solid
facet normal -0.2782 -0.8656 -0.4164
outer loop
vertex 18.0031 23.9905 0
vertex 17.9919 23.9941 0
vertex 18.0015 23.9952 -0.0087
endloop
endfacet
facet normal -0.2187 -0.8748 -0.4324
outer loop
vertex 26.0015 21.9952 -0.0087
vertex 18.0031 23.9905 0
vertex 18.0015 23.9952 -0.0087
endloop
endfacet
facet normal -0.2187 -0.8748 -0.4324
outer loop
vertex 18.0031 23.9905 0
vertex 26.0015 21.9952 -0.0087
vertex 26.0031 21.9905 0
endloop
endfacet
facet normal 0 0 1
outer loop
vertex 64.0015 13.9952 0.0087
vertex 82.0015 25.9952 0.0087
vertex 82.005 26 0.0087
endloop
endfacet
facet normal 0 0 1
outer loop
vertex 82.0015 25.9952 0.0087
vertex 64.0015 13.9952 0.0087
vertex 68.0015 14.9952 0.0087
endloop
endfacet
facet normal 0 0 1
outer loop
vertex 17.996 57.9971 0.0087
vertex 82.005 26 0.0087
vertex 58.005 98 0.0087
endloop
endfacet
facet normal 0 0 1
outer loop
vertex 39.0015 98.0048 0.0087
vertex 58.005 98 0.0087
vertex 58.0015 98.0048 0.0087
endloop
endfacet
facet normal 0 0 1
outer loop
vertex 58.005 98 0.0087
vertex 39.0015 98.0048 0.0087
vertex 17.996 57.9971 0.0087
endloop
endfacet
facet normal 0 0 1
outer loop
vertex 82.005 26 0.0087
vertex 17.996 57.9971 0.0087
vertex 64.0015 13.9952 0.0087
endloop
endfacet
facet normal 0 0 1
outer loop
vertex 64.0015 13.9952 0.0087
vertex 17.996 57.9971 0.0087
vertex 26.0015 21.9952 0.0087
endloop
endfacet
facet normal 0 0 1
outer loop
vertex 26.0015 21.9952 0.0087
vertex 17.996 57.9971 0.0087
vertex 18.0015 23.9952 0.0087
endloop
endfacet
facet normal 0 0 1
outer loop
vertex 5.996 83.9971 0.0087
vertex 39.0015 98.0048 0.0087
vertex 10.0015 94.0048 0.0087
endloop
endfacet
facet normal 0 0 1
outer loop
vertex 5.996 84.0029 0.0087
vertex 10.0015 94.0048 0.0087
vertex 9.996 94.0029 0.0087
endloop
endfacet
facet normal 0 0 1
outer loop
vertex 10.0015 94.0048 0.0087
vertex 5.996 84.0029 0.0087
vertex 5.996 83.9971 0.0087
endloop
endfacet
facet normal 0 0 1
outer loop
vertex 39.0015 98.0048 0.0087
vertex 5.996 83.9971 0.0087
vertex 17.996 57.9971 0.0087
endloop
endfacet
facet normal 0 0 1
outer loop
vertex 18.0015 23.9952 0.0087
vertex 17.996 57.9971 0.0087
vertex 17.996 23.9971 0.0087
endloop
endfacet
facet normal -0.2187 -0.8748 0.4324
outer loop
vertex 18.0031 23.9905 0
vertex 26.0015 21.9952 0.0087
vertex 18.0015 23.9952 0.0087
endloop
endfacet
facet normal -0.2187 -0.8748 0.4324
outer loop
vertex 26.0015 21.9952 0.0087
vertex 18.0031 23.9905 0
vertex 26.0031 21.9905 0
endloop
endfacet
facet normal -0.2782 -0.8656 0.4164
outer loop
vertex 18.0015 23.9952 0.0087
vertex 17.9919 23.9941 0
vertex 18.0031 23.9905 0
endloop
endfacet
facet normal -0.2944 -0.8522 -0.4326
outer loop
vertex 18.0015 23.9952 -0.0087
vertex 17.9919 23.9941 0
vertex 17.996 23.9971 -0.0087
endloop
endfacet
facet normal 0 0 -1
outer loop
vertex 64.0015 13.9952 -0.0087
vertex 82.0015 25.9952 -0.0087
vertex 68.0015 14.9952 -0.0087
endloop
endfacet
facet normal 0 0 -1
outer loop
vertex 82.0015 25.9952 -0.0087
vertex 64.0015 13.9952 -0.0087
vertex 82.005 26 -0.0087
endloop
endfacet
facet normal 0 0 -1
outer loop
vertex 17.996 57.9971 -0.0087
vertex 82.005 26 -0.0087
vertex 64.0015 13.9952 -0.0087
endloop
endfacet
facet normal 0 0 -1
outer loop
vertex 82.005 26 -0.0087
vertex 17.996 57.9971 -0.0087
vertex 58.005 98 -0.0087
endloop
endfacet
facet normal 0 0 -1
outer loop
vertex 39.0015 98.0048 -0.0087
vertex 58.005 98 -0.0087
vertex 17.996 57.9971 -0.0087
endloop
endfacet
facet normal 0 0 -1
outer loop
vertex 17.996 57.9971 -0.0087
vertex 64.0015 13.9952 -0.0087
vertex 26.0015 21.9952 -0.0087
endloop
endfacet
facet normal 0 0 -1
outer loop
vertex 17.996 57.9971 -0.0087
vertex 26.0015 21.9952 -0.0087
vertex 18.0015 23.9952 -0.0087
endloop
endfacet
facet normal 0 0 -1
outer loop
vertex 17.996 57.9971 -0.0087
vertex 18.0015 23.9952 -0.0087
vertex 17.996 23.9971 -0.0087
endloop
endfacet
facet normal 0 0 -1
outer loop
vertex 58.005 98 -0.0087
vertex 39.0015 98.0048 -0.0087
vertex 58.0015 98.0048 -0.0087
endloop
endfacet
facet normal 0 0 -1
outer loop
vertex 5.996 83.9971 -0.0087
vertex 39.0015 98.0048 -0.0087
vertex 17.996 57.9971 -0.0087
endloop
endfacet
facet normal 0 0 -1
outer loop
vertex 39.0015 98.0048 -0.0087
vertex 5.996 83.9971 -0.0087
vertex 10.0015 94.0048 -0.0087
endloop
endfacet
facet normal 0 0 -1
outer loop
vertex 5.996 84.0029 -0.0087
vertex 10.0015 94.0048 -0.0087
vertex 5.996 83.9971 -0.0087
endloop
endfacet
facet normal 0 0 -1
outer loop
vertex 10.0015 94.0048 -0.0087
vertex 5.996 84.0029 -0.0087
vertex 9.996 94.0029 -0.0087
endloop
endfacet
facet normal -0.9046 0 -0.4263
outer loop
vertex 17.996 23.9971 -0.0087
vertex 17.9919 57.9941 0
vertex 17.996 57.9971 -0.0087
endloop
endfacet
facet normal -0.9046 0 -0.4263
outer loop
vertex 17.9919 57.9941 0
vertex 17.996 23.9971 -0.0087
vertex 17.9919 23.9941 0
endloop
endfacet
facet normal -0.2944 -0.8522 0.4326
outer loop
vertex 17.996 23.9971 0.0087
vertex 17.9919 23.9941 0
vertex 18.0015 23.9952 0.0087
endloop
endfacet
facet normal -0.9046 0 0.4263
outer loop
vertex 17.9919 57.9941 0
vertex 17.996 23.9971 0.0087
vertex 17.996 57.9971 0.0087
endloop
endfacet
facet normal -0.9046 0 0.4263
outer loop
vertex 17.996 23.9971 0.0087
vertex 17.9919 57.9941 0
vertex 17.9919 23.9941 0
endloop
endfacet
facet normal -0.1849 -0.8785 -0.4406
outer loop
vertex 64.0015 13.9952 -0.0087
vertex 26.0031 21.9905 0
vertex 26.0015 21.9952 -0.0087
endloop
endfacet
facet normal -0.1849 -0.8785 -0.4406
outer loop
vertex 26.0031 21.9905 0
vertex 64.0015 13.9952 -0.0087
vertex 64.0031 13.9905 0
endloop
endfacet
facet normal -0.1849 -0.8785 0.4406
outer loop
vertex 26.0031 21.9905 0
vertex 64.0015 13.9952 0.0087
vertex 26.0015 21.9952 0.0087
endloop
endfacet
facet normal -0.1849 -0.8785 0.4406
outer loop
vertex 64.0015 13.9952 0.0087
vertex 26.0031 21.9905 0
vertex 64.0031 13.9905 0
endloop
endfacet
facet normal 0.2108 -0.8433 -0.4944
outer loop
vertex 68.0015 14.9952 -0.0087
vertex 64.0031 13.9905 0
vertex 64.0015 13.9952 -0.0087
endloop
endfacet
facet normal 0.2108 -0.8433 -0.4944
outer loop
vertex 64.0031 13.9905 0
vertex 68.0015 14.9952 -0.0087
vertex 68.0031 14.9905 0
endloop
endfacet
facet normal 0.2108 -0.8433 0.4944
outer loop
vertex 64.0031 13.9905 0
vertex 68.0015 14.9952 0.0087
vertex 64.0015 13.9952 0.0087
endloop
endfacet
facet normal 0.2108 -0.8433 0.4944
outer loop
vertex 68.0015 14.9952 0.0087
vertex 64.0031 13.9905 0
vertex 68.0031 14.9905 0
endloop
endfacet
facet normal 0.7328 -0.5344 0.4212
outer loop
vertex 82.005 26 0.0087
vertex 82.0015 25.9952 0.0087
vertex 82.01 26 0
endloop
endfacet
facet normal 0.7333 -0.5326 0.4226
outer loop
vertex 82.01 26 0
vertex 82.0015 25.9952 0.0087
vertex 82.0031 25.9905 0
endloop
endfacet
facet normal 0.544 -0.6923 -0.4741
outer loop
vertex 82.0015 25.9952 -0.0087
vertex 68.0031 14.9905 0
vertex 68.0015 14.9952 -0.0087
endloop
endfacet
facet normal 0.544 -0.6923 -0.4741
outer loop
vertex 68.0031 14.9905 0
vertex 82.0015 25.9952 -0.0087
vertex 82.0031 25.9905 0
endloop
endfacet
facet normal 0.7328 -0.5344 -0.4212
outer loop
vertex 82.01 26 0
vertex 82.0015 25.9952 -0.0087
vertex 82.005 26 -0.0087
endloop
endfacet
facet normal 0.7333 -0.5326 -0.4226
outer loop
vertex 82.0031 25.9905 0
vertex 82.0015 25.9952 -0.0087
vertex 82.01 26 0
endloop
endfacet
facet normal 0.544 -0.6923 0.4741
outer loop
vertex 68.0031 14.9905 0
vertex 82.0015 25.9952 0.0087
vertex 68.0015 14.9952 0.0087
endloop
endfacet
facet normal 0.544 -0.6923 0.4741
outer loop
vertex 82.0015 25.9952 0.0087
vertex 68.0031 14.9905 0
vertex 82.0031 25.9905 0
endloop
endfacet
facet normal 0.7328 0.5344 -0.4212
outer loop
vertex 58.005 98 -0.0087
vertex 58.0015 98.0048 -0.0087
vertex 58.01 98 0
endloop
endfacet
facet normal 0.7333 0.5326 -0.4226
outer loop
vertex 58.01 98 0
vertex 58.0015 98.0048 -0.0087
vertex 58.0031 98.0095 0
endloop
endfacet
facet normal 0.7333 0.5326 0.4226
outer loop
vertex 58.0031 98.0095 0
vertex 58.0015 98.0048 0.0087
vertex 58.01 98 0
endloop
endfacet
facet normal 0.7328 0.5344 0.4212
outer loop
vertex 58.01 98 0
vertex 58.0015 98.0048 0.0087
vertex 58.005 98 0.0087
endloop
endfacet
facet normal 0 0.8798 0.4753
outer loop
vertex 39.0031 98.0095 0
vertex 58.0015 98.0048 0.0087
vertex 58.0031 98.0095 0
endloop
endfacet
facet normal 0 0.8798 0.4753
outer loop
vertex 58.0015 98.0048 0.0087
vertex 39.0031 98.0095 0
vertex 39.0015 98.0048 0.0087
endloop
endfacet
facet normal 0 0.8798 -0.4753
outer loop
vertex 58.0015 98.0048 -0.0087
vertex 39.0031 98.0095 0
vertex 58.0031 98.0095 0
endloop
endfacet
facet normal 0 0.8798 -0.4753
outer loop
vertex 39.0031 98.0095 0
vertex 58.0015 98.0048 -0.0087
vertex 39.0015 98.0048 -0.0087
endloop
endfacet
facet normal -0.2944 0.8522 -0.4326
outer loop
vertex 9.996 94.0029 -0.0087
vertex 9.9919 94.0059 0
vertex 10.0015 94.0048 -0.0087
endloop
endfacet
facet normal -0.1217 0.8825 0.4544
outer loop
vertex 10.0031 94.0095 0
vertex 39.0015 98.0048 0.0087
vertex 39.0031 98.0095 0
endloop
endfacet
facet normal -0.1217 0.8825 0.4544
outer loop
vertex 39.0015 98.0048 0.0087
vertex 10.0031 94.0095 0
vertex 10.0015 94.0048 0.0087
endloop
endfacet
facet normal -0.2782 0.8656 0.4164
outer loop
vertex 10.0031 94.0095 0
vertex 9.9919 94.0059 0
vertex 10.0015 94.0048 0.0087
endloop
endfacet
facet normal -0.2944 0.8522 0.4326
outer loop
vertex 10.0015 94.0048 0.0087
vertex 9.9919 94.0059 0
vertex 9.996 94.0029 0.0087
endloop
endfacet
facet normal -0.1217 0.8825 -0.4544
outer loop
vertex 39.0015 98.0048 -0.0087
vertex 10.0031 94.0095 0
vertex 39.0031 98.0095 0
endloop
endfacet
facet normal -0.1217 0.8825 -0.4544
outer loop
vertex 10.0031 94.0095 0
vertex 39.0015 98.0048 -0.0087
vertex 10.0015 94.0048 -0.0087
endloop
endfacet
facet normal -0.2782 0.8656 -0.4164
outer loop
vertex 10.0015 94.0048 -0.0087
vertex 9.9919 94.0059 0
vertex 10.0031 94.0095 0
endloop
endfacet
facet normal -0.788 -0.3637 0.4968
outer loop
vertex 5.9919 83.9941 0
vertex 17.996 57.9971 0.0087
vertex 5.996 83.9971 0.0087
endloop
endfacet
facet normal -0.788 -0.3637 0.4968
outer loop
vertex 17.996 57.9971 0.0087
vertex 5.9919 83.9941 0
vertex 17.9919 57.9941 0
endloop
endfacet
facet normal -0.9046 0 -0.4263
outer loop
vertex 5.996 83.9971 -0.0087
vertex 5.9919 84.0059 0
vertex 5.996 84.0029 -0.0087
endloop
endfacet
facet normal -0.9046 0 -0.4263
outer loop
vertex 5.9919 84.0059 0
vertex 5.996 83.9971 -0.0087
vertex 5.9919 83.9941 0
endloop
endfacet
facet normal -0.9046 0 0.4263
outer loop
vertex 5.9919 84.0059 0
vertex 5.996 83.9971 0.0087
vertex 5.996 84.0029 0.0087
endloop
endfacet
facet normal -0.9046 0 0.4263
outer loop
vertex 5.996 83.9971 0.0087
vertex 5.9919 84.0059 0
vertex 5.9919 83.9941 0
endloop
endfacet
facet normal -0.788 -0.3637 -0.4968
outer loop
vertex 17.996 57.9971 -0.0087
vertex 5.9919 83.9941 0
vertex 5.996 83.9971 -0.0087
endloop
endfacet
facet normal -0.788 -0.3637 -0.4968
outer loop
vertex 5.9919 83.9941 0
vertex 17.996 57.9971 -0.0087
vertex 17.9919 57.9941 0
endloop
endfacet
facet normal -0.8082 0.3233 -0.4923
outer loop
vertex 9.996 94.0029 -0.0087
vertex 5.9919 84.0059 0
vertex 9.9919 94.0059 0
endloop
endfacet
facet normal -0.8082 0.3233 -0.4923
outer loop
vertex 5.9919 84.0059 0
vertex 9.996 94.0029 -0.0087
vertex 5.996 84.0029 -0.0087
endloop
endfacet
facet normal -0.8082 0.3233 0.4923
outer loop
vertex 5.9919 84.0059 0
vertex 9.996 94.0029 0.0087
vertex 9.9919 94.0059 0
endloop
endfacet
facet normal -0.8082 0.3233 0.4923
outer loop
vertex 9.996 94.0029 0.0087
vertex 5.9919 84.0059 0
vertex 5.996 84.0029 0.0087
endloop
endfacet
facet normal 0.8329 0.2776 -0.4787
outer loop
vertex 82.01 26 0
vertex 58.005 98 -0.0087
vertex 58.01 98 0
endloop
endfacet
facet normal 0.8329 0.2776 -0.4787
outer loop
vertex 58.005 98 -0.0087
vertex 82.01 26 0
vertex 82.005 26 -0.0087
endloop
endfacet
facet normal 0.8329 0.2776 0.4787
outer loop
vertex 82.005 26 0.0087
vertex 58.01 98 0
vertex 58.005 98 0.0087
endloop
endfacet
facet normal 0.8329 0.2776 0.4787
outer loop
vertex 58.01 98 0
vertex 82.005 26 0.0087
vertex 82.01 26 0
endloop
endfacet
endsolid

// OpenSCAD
color([0.3519350680925015,0.6477014615427978,0.14125726454845833]) hull(){
    translate([18,24]) sphere(0.01);
    translate([26,22]) sphere(0.01);
    translate([42,29]) sphere(0.01);
}
color([0.23013900541024712,0.8285218163248013,0.9603761550286747]) hull(){
    translate([26,22]) sphere(0.01);
    translate([64,14]) sphere(0.01);
    translate([42,29]) sphere(0.01);
}
color([0.6050710034948523,0.017553655236826726,0.43262871278032167]) hull(){
    translate([42,29]) sphere(0.01);
    translate([64,14]) sphere(0.01);
    translate([58,33]) sphere(0.01);
}
color([0.2571490251669072,0.4480229944680496,0.14517873337393172]) hull(){
    translate([64,14]) sphere(0.01);
    translate([68,15]) sphere(0.01);
    translate([58,33]) sphere(0.01);
}
color([0.8405131005933094,0.9776834869331054,0.10300019528175153]) hull(){
    translate([58,33]) sphere(0.01);
    translate([68,15]) sphere(0.01);
    translate([82,26]) sphere(0.01);
}
color([0.998153073210626,0.8535026464000083,0.6855970549077809]) hull(){
    translate([42,29]) sphere(0.01);
    translate([44,55]) sphere(0.01);
    translate([58,33]) sphere(0.01);
}
color([0.7995005100691247,0.34047238184459006,0.1286635278612125]) hull(){
    translate([42,29]) sphere(0.01);
    translate([44,55]) sphere(0.01);
    translate([44,47]) sphere(0.01);
}
color([0.6020598448119898,0.9167847797194366,0.02081986636819022]) hull(){
    translate([44,47]) sphere(0.01);
    translate([18,58]) sphere(0.01);
    translate([42,29]) sphere(0.01);
}
color([0.9135118305629362,0.3823609034395232,0.42581309278619206]) hull(){
    translate([18,58]) sphere(0.01);
    translate([18,24]) sphere(0.01);
    translate([42,29]) sphere(0.01);
}
color([0.08967296065919184,0.0016857337534631478,0.31287848776698257]) hull(){
    translate([18,58]) sphere(0.01);
    translate([44,47]) sphere(0.01);
    translate([44,55]) sphere(0.01);
}
color([0.09731792302828757,0.364404074066101,0.8754307508322564]) hull(){
    translate([18,58]) sphere(0.01);
    translate([44,55]) sphere(0.01);
    translate([22,90]) sphere(0.01);
}
color([0.6967090939923642,0.5776053806129825,0.18685318159950626]) hull(){
    translate([44,55]) sphere(0.01);
    translate([50,93]) sphere(0.01);
    translate([22,90]) sphere(0.01);
}
color([0.9585806736472646,0.593334846568766,0.09927504601217696]) hull(){
    translate([44,55]) sphere(0.01);
    translate([50,93]) sphere(0.01);
    translate([58,33]) sphere(0.01);
}
color([0.19313665173925,0.6863688301261038,0.2093263356404984]) hull(){
    translate([50,93]) sphere(0.01);
    translate([58,98]) sphere(0.01);
    translate([58,33]) sphere(0.01);
}
color([0.2694340379225941,0.24598969558588324,0.16092298384524362]) hull(){
    translate([50,93]) sphere(0.01);
    translate([58,98]) sphere(0.01);
    translate([39,98]) sphere(0.01);
}
color([0.5102606956149307,0.431705445139412,0.38909399282504675]) hull(){
    translate([50,93]) sphere(0.01);
    translate([39,98]) sphere(0.01);
    translate([22,90]) sphere(0.01);
}
color([0.3194819673674283,0.6655357355223767,0.22692357675811492]) hull(){
    translate([22,90]) sphere(0.01);
    translate([39,98]) sphere(0.01);
    translate([10,94]) sphere(0.01);
}
color([0.9464906820257937,0.35776616524050997,0.9421064453260054]) hull(){
    translate([22,90]) sphere(0.01);
    translate([10,94]) sphere(0.01);
    translate([18,58]) sphere(0.01);
}
color([0.3792404853118415,0.27508202782836655,0.9368074710650367]) hull(){
    translate([18,58]) sphere(0.01);
    translate([10,94]) sphere(0.01);
    translate([6,84]) sphere(0.01);
}
color([0.7670397757471089,0.17483880300164423,0.7474114244696689]) hull(){
    translate([58,98]) sphere(0.01);
    translate([82,26]) sphere(0.01);
    translate([50,93]) sphere(0.01);
}
color([0.6015236368594579,0.5872808850844162,0.28390336255679416]) hull(){
    translate([58,98]) sphere(0.01);
    translate([82,26]) sphere(0.01);
    translate([58,33]) sphere(0.01);
}
